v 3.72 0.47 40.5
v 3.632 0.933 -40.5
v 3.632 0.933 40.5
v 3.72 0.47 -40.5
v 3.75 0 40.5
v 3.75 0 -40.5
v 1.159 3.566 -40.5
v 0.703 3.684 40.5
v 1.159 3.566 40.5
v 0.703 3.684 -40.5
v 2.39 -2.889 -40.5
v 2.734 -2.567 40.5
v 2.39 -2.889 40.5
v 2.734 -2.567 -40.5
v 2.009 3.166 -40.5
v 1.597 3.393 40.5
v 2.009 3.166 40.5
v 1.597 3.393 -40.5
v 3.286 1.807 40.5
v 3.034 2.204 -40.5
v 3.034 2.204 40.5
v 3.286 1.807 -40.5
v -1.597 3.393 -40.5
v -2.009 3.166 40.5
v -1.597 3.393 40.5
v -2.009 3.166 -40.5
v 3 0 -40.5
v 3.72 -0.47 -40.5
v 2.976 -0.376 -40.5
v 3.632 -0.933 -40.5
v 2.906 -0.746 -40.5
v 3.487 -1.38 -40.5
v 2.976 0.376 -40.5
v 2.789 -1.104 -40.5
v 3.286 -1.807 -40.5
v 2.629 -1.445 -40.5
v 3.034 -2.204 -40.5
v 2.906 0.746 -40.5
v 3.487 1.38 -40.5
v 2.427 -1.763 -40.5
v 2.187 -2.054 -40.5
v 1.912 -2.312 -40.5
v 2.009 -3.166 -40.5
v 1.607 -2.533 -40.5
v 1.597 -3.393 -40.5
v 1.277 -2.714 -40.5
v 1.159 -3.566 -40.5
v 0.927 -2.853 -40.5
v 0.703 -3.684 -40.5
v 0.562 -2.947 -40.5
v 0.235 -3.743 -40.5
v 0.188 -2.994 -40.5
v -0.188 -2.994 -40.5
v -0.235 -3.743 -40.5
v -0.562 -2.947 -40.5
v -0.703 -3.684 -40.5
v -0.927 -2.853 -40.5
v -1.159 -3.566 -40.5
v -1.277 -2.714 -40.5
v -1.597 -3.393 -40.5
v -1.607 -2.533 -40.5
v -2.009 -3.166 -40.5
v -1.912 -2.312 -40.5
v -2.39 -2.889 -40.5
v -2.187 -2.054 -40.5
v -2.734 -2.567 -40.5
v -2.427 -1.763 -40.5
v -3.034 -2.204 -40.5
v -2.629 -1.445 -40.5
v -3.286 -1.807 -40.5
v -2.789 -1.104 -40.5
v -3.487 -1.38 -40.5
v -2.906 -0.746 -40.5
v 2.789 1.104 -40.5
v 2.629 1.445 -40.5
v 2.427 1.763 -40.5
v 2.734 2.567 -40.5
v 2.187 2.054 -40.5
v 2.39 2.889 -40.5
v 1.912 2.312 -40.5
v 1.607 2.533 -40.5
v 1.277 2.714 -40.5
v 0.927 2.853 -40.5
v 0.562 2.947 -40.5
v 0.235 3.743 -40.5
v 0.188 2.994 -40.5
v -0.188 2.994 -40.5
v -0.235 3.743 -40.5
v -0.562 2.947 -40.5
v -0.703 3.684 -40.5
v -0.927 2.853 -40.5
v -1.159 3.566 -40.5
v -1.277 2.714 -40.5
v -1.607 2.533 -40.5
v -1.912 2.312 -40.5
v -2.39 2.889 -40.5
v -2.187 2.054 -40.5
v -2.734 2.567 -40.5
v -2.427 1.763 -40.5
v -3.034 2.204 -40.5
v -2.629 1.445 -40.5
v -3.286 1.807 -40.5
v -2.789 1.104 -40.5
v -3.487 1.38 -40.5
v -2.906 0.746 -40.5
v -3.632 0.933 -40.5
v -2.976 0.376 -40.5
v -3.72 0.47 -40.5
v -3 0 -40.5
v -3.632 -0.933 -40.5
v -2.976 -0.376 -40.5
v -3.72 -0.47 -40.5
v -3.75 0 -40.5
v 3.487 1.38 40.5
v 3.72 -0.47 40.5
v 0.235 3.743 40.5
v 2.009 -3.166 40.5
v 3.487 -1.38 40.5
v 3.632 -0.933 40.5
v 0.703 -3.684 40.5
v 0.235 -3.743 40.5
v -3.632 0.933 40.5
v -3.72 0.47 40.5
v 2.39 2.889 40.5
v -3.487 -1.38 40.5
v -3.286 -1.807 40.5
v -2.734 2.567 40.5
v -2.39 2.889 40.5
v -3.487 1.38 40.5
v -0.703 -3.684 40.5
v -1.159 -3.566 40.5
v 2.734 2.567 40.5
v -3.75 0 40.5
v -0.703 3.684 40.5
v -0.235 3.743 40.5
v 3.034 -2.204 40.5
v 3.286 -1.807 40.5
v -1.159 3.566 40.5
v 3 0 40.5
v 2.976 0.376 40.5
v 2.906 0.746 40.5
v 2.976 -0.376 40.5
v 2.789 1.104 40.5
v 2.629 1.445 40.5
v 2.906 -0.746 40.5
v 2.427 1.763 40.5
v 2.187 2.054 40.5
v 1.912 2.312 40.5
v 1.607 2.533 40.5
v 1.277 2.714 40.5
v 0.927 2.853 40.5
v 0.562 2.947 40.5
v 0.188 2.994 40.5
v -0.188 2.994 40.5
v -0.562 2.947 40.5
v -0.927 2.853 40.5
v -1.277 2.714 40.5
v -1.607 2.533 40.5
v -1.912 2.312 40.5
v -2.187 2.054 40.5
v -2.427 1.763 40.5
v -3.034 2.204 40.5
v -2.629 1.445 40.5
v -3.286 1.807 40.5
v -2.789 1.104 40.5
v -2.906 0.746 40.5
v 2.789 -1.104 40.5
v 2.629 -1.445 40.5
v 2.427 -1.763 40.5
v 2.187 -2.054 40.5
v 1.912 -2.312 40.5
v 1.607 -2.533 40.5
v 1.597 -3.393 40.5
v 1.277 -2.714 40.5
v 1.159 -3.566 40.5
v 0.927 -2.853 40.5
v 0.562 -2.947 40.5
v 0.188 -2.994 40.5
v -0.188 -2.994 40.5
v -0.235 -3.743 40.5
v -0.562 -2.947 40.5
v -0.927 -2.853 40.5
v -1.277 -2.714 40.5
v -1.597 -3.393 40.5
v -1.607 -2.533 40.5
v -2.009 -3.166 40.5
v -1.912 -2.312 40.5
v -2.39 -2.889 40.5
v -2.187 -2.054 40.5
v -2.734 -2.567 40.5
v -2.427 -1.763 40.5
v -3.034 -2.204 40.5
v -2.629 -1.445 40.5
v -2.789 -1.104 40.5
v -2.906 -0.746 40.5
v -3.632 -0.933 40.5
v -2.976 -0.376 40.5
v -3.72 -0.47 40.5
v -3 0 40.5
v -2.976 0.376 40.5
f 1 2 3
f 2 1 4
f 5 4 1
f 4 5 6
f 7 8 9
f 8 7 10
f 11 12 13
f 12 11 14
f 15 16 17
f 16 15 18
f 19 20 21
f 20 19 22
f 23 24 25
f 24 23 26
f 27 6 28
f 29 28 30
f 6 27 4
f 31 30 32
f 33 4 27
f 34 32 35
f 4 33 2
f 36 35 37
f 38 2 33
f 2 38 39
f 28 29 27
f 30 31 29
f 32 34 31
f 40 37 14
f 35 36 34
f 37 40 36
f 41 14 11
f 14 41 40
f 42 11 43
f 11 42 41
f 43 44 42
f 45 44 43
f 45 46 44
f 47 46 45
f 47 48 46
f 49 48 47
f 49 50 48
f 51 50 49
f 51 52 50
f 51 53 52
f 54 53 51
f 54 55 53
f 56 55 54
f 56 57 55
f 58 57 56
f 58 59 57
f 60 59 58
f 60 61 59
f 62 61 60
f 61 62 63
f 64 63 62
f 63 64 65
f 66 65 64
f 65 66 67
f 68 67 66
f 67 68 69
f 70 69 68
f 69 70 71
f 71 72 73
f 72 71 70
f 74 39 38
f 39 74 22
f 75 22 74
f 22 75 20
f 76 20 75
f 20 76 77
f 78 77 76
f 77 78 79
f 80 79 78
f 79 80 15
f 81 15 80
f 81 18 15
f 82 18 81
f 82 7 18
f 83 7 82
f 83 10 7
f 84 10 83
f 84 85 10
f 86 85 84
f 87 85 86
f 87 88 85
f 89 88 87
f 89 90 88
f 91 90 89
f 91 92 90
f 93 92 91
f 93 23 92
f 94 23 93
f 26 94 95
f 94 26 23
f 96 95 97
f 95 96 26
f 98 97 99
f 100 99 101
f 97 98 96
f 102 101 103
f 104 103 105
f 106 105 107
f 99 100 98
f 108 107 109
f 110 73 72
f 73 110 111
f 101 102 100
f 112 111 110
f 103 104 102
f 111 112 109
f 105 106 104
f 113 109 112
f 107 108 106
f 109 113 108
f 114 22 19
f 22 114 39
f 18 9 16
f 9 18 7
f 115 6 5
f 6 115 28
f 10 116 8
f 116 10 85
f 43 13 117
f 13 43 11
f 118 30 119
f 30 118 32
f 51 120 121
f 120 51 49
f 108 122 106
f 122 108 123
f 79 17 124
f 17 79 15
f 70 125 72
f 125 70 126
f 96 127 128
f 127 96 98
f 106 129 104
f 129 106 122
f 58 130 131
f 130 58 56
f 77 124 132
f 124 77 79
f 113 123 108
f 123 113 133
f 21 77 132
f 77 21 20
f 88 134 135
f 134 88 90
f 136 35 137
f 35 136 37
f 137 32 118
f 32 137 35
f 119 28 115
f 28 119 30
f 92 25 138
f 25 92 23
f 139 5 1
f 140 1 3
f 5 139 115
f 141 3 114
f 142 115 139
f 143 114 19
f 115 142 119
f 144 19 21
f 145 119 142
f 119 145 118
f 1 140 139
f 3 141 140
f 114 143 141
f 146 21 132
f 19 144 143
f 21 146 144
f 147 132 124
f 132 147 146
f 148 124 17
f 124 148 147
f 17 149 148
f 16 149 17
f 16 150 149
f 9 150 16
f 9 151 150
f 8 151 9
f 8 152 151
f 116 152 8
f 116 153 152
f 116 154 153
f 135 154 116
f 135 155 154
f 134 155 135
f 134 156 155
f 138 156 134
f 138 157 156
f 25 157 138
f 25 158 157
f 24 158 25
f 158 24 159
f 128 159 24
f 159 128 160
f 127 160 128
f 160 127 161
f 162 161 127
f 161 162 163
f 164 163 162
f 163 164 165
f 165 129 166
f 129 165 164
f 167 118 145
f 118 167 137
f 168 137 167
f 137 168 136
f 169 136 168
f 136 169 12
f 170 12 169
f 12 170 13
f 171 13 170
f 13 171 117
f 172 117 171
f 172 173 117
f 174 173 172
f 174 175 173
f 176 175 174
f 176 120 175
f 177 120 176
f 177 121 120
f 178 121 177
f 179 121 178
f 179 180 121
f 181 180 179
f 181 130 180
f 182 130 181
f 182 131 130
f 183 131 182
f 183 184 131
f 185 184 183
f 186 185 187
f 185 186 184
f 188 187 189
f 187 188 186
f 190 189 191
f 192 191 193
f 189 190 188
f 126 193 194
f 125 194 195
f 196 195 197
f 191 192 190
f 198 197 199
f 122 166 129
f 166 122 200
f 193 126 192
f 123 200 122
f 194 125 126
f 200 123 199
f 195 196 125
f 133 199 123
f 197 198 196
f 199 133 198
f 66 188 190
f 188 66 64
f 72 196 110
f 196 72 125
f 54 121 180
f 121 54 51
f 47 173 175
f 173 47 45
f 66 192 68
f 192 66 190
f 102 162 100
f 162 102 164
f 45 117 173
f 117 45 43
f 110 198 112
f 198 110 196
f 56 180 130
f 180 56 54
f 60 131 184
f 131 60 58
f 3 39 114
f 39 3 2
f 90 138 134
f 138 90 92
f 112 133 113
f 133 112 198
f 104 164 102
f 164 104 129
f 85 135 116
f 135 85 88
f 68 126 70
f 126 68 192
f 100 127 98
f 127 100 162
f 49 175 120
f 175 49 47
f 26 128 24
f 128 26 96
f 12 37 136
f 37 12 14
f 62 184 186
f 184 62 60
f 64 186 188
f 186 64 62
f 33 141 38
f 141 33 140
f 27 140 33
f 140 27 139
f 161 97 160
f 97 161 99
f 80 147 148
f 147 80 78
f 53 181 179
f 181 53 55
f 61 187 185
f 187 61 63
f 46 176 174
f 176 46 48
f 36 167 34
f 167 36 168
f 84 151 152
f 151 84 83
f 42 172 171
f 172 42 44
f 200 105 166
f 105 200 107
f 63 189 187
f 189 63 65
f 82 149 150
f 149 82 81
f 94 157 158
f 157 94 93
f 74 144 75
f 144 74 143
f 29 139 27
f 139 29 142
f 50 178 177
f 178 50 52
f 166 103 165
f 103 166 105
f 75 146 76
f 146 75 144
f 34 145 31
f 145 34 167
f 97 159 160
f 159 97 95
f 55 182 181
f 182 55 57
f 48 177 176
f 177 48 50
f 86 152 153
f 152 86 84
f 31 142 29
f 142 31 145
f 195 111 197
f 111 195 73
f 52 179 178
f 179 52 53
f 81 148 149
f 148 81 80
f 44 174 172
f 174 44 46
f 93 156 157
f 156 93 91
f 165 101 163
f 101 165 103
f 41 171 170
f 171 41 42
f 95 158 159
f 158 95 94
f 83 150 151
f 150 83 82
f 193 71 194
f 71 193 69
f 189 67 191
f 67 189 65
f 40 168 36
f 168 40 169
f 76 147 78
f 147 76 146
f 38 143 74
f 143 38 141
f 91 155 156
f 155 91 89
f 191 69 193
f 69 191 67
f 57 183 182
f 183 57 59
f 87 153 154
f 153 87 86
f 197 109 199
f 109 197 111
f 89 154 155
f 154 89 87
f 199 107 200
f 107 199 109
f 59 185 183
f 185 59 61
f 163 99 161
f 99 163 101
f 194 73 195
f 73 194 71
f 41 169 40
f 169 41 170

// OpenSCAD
$fn = 50;


difference() {
	union() {
		translate(v = [0, 0, -40.5000000000]) {
			cylinder(h = 81, r = 3.7500000000);
		}
	}
	union() {
		translate(v = [0, 0, -100.0000000000]) {
			cylinder(h = 200, r = 3.0000000000);
		}
	}
}
